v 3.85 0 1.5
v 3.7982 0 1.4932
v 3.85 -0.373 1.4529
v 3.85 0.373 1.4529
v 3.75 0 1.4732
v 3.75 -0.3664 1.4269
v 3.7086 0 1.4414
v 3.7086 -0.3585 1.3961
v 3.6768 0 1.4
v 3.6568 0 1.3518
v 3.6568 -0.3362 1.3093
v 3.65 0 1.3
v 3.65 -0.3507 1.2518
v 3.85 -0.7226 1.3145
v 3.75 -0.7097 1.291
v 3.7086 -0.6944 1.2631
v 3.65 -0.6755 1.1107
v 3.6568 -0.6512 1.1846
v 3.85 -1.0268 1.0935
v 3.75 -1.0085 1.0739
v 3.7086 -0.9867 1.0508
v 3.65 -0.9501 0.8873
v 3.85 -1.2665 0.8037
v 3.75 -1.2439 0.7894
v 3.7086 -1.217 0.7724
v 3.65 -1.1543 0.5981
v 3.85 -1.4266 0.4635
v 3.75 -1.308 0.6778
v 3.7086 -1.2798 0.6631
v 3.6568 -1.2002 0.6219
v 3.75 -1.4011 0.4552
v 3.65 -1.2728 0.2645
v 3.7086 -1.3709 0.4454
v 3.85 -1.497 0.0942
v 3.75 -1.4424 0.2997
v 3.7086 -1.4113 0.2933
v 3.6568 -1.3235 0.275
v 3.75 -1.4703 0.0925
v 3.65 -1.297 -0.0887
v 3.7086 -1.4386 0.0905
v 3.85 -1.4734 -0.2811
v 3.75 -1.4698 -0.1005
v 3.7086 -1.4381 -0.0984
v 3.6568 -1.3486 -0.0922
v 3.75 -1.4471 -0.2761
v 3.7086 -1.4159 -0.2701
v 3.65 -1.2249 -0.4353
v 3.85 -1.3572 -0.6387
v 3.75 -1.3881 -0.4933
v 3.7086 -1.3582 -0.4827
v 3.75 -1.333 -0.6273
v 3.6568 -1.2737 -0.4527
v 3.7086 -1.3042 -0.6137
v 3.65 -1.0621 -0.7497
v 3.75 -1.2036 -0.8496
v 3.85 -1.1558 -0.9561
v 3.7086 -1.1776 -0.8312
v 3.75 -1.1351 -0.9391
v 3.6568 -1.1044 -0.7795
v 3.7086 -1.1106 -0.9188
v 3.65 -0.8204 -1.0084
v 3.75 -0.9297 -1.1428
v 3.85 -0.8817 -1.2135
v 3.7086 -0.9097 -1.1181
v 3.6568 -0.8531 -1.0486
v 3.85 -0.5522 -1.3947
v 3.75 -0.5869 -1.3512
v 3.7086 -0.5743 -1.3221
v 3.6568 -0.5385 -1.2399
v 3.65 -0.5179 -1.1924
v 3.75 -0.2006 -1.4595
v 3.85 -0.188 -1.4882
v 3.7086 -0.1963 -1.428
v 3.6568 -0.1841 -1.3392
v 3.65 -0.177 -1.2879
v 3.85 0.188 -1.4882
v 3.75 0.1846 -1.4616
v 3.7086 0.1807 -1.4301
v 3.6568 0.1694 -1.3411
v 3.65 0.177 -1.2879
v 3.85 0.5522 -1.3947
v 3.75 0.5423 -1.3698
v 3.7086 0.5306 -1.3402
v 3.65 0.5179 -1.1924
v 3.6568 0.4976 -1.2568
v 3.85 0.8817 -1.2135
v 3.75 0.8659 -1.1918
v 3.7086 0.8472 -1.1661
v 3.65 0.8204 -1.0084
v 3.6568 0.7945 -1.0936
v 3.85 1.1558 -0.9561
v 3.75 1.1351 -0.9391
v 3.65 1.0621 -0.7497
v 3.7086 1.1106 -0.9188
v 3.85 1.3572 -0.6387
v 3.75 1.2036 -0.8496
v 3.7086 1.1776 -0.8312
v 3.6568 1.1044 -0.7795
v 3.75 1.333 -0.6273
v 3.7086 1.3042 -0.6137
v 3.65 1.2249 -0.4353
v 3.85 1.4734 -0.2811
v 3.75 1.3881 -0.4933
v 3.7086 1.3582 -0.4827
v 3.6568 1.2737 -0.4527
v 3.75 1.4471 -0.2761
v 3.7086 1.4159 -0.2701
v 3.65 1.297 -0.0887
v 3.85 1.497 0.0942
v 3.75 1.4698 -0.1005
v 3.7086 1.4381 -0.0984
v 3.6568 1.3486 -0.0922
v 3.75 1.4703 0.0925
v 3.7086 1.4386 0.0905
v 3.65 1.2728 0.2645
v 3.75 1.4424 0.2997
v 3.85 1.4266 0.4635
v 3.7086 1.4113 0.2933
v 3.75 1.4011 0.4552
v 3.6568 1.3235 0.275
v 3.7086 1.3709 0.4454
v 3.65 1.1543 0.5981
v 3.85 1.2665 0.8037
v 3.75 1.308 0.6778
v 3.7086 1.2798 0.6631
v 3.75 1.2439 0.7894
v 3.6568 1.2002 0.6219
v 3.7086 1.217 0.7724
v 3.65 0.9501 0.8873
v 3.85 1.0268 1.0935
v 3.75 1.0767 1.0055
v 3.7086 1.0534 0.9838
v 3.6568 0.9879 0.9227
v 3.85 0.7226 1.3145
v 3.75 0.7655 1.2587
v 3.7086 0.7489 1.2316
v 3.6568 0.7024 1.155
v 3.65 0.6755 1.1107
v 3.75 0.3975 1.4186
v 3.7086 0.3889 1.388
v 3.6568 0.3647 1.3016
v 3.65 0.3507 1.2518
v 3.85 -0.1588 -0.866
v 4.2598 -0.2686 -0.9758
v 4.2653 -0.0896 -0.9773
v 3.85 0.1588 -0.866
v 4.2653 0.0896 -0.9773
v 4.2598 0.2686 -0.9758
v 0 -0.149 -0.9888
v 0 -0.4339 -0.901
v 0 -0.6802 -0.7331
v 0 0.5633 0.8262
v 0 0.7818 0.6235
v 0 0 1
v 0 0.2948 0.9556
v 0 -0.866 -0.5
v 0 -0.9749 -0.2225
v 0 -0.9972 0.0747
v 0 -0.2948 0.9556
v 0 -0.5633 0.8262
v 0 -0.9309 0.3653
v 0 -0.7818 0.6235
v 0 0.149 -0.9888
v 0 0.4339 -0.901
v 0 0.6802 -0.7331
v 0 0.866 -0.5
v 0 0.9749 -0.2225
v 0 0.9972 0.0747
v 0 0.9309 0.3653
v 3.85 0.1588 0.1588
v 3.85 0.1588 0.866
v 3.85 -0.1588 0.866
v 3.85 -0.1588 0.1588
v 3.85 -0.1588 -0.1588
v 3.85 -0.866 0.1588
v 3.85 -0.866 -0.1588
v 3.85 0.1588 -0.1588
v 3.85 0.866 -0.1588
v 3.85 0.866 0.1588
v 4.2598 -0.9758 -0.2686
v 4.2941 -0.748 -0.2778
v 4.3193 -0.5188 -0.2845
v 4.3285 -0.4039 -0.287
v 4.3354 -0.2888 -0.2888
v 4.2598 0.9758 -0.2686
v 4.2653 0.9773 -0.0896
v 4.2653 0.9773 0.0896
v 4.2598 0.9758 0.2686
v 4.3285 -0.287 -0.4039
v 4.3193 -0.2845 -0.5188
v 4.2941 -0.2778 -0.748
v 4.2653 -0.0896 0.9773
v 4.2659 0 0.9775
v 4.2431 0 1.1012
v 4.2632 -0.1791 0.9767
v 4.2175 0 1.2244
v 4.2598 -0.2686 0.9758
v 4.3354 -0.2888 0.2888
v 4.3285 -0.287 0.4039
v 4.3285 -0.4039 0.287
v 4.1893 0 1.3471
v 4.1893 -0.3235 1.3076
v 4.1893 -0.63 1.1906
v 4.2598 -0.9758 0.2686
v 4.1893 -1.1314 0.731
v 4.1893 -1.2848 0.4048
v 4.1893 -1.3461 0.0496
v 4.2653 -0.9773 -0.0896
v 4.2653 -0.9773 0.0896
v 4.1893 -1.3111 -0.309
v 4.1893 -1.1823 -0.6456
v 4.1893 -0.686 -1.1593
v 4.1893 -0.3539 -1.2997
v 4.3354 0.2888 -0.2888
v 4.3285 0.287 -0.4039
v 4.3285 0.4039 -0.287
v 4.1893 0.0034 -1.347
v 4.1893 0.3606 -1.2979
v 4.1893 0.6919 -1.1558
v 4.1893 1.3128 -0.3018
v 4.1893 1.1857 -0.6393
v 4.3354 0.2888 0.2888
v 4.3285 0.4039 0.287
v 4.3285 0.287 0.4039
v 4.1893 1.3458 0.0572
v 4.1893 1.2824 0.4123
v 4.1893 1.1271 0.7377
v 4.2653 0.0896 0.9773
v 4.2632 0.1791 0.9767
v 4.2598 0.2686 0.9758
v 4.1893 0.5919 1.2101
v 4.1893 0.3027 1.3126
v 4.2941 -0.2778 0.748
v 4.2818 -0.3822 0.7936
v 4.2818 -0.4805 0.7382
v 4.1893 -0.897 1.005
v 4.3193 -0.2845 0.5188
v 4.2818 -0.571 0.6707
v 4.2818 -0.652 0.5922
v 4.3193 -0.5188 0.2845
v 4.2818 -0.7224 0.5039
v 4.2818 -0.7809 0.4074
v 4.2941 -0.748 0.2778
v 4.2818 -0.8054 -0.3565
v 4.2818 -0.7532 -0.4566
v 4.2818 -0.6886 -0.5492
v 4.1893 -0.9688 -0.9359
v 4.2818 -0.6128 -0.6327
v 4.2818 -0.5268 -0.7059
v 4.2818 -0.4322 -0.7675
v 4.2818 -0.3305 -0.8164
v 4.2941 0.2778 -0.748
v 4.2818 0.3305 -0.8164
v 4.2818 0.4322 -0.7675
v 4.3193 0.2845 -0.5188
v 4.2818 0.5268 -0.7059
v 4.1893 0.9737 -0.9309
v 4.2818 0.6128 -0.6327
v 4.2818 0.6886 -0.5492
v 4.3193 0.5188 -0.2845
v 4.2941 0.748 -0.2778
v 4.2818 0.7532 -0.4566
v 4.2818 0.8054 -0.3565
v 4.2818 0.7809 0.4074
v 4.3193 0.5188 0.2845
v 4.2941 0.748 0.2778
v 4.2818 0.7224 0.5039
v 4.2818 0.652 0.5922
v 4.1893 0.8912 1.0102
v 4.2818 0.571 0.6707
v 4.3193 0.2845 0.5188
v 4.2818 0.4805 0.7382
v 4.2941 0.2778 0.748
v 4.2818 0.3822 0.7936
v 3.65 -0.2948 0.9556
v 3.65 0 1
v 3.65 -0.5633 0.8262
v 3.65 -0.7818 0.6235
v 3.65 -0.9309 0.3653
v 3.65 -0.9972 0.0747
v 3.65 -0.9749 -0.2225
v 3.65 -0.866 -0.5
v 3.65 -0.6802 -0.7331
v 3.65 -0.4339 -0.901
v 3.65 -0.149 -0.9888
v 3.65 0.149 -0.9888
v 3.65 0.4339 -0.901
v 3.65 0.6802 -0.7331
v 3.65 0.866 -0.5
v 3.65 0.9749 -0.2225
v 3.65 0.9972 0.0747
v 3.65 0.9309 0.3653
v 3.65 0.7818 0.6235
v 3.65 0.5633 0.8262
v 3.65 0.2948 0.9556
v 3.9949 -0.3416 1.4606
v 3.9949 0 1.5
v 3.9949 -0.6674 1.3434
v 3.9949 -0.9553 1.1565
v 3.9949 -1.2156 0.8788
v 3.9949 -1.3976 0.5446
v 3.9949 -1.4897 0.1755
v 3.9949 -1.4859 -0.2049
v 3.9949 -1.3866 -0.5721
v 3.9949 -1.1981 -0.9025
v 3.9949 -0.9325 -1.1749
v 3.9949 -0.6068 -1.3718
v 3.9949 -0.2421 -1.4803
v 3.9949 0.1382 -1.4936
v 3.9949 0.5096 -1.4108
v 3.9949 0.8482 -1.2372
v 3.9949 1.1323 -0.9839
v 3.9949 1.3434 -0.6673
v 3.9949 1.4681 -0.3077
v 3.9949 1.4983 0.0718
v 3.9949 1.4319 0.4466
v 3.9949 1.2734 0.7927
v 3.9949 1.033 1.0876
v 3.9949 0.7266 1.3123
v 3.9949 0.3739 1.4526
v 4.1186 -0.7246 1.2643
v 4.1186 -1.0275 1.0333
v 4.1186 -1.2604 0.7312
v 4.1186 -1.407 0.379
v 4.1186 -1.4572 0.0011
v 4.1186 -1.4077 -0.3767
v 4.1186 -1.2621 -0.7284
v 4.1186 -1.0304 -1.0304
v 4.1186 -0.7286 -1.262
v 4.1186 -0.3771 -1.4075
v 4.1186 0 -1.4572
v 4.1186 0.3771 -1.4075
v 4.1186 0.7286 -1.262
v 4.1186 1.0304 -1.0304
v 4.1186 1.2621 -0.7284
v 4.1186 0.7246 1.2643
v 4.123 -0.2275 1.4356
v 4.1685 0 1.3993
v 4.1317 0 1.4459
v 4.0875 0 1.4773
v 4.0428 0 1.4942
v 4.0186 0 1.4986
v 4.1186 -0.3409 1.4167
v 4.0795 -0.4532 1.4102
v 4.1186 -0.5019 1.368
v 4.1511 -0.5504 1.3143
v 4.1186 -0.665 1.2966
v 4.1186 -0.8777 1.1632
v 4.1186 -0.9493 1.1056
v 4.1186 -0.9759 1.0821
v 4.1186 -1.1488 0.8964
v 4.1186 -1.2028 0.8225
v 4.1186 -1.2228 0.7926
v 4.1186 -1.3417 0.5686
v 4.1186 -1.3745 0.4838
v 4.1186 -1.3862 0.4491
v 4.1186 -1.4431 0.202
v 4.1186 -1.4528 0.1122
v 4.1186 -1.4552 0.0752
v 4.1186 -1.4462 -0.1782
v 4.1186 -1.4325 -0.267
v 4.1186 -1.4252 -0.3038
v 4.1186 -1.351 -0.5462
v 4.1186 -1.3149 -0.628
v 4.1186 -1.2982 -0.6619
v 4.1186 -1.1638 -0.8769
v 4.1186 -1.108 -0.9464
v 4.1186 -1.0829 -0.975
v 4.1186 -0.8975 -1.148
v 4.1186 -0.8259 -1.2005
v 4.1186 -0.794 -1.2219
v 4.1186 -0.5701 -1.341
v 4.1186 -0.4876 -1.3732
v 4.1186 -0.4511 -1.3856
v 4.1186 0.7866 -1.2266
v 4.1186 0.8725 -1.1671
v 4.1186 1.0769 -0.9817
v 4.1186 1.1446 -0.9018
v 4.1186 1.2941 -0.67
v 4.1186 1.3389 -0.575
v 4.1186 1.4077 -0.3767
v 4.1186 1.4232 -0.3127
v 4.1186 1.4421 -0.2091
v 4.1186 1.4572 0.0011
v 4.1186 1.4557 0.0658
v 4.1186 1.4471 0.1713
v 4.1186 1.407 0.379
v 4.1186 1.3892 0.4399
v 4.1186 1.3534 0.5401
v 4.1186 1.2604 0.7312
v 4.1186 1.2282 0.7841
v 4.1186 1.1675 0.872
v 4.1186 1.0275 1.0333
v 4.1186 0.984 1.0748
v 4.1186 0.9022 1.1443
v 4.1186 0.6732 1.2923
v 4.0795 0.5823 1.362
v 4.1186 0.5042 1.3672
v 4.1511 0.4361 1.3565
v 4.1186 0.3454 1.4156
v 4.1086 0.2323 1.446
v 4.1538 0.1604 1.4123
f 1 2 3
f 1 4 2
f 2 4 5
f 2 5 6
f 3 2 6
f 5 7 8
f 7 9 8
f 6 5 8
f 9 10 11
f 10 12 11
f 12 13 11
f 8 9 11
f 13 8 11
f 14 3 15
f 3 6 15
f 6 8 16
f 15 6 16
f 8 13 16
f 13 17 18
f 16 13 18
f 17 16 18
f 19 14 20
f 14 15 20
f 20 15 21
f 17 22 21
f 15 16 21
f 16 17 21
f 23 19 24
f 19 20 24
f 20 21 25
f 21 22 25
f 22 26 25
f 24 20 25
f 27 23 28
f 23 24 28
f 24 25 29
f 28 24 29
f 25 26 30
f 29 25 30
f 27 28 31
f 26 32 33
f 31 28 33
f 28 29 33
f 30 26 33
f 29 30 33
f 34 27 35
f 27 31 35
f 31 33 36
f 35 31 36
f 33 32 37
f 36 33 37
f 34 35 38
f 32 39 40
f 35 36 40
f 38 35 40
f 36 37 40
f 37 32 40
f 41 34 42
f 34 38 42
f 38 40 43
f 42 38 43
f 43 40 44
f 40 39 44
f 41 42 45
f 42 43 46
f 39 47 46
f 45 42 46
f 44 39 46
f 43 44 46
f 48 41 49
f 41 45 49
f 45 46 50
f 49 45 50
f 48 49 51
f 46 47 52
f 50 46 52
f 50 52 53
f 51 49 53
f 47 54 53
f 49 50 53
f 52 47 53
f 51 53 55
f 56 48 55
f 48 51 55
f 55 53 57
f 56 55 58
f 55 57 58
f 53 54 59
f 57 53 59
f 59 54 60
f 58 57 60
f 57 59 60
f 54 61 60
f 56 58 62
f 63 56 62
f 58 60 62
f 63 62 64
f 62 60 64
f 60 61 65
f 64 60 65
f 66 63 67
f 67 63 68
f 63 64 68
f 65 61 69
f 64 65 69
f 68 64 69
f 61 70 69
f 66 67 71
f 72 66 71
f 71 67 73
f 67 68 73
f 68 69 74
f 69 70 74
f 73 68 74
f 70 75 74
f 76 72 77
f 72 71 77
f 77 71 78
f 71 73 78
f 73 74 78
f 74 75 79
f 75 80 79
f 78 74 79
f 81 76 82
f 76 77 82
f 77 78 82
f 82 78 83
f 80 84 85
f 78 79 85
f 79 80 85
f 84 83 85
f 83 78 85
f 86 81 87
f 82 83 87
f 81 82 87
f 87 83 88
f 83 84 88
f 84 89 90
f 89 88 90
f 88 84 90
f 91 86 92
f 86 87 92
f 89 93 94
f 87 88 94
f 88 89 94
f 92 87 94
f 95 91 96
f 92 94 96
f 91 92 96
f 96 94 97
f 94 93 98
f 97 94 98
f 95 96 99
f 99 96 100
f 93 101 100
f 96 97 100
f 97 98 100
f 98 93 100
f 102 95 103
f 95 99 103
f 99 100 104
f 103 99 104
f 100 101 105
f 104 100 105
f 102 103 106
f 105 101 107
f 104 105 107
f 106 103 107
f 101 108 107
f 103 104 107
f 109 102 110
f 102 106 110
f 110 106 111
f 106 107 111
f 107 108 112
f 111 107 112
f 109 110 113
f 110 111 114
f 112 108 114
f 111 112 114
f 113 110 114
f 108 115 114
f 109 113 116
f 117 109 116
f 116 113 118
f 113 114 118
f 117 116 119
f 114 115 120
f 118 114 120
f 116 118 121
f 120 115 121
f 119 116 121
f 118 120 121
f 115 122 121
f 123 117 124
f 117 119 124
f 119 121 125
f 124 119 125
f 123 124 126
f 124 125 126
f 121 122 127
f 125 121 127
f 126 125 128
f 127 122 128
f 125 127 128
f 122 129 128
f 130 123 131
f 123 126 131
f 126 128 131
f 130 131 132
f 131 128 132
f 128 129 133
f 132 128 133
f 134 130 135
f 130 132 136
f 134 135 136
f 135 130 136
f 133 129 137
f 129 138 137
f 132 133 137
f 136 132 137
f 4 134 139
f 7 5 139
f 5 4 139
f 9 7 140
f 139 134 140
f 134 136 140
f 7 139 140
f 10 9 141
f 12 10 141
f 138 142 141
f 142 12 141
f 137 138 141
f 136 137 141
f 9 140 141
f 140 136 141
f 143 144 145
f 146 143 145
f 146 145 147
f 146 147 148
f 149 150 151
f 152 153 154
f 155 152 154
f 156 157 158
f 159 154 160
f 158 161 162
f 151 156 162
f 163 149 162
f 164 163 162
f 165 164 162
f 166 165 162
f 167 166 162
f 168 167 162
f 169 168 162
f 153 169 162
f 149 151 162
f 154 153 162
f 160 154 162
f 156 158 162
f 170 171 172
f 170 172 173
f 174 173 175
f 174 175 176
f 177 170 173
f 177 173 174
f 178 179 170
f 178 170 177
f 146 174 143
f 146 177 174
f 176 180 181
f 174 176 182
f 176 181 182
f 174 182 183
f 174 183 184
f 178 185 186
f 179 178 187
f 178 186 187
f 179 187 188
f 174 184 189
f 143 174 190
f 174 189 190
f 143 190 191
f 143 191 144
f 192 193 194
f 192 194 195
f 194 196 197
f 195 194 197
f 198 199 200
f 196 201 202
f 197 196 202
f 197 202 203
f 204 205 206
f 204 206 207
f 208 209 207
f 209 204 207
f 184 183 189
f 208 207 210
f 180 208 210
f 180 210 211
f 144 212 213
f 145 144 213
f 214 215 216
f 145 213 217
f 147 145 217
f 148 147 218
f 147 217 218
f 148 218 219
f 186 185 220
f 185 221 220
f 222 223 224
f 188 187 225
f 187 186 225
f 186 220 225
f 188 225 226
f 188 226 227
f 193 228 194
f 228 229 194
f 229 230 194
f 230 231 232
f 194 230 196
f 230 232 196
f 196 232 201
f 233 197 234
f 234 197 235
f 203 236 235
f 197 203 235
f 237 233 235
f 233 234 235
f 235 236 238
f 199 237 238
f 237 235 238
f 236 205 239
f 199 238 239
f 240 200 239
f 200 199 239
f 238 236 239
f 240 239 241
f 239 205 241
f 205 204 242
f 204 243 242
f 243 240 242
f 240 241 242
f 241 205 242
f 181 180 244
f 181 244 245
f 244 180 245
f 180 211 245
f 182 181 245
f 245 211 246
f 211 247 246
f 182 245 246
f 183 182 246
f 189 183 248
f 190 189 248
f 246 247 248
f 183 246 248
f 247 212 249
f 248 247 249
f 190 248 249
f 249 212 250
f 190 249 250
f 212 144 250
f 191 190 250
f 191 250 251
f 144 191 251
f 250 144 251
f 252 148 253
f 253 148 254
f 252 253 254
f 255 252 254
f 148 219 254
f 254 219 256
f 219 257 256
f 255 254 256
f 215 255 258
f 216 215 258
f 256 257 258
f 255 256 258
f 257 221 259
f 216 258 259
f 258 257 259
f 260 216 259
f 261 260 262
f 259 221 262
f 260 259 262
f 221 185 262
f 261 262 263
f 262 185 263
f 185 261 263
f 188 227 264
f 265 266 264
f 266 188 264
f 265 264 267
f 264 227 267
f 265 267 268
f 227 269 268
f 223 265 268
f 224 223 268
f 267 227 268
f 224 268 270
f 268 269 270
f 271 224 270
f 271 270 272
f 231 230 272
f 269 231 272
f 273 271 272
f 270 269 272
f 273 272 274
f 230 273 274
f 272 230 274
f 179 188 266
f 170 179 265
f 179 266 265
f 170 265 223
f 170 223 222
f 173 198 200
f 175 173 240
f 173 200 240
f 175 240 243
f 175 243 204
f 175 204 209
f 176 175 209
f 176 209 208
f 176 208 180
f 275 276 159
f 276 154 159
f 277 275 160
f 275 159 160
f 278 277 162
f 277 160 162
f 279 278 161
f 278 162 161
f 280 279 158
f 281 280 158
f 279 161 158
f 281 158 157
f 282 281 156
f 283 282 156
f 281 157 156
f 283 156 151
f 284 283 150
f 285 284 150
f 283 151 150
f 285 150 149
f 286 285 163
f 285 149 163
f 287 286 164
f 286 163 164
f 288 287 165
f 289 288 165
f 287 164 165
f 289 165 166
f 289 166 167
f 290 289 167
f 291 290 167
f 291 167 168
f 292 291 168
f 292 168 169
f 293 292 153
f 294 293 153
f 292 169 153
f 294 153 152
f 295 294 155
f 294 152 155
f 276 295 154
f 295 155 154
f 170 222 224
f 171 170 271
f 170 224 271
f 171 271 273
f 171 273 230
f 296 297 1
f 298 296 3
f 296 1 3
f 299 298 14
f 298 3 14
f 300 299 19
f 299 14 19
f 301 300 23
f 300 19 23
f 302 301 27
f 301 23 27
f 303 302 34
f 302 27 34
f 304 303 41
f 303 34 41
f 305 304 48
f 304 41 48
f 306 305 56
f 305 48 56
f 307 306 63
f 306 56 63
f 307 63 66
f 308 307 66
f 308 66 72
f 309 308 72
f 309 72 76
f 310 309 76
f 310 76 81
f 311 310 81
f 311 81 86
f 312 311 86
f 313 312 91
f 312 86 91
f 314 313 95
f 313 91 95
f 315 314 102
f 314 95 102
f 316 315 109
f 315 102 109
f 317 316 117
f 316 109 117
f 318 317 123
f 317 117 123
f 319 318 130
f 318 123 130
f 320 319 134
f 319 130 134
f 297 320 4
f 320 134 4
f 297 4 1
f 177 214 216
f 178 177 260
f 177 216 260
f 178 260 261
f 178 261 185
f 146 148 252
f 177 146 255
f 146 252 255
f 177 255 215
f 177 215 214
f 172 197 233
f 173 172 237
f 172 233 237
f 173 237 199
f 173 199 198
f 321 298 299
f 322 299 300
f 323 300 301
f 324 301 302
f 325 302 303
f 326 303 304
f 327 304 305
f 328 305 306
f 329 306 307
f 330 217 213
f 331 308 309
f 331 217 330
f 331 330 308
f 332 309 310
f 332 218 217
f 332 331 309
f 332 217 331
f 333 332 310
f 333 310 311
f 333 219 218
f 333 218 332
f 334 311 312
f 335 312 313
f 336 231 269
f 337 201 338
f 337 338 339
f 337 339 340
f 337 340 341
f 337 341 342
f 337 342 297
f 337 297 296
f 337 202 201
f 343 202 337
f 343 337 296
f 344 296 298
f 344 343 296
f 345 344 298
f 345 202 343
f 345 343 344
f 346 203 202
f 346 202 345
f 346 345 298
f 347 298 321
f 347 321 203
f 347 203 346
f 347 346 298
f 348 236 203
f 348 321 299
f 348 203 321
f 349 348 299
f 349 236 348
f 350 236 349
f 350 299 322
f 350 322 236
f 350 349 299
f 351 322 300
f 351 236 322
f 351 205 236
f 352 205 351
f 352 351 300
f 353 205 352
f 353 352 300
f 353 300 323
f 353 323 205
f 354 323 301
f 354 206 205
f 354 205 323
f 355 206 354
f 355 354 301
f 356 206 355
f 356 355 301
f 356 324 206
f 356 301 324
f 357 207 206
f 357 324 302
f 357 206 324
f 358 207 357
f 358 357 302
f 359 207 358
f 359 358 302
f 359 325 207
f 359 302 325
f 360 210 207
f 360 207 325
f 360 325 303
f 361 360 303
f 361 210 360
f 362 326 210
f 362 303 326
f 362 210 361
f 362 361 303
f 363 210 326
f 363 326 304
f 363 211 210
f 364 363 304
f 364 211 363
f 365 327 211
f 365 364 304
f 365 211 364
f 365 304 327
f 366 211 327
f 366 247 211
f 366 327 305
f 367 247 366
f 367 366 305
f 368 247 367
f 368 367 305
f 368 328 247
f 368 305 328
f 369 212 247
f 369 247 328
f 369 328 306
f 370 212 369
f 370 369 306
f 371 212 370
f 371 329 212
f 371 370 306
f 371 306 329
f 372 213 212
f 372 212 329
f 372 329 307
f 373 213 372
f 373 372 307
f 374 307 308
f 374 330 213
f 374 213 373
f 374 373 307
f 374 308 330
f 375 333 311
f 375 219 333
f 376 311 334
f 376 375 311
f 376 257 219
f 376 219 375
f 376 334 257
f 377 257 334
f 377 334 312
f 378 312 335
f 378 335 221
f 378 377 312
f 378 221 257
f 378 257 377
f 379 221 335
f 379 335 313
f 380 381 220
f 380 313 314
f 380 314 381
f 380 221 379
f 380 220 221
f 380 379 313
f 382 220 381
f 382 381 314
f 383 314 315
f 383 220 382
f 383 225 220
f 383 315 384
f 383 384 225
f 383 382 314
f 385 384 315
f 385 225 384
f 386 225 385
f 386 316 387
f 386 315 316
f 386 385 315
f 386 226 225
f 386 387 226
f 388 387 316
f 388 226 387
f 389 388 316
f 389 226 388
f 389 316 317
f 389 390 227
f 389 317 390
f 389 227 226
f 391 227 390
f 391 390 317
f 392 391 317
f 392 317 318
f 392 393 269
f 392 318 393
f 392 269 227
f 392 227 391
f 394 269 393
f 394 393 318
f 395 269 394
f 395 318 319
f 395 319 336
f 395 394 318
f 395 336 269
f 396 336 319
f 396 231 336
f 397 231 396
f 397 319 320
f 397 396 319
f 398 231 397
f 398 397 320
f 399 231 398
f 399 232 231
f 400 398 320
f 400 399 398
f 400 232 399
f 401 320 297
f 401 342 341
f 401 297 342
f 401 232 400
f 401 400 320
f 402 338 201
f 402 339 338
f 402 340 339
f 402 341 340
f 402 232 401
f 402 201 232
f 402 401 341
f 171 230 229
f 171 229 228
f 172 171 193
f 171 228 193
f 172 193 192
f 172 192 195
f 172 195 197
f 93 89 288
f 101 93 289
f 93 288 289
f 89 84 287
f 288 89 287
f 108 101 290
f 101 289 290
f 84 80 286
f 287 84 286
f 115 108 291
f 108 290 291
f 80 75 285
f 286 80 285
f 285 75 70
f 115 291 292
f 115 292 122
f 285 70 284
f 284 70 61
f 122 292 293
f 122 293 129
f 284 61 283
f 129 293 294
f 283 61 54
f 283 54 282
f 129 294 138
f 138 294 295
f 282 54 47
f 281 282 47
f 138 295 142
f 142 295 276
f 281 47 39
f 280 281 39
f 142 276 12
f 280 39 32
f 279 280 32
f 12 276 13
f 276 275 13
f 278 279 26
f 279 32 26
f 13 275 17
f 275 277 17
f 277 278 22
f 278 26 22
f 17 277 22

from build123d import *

# Parameters (mm, degrees)
FILLET1_R          = 0.2
CUT_EXTRUDE1_DEPTH = 0.5
CUT_EXTRUDE1_DRAFT = -15


with BuildPart() as part:
    # Sketch1 → Revolve1 (revolve)
    with BuildSketch(Plane.XY, mode=Mode.PRIVATE) as revolve1_sk:
        with BuildLine():
            Line((0, 0), (4.35, 0))
            ThreePointArc((4.35, 0), (4.299779731, 0.756637298), (4.15, 1.5))
            Line((4.15, 1.5), (3.65, 1.5))
            Line((3.65, 1.5), (3.65, 1))
            Line((3.65, 1), (0, 1))
            Line((0, 1), (0, 0))
        make_face()
    revolve(revolve1_sk.sketch.rotate(Axis((-102.03816923, 0, 0), (1, 0, 0)), 90), axis=Axis((-102.03816923, 0, 0), (1, 0, 0)))

    # Fillet1
    fillet1_edges = [part.edges().sort_by_distance(p)[0] for p in [
        (3.65, 0, -1.5),
        (4.15, 0, -1.5),
    ]]
    fillet(fillet1_edges, radius=FILLET1_R)


with BuildPart() as cut_extrude1_tool:
    # Sketch2 → Cut-Extrude1 (with draft: the straight prism first)
    with BuildSketch(Plane(origin=(4.35, 0, 0), x_dir=(0, 0, -1), z_dir=(1, 0, 0))):
        Polygon((0.29273093, 1), (-0.29273093, 1), (-0.29273093, 0.29273093), (-1, 0.29273093), (-1, -0.29273093), (-0.29273093, -0.29273093), (-0.29273093, -1), (0.29273093, -1), (0.29273093, -0.29273093), (1, -0.29273093), (1, 0.29273093), (0.29273093, 0.29273093), align=None)
    extrude(amount=-CUT_EXTRUDE1_DEPTH)
    # Cut-Extrude1: the draft: its side faces are tilted about the plane it starts from
    cut_extrude1_sides = [cut_extrude1_tool.faces().sort_by_distance(p)[0] for p in [
        (4.1, 1, 0),
        (4.1, 0.646365465, 0.29273093),
        (4.1, 0.29273093, 0.646365465),
        (4.1, 0, 1),
        (4.1, -0.29273093, 0.646365465),
        (4.1, -0.646365465, 0.29273093),
        (4.1, -1, 0),
        (4.1, -0.646365465, -0.29273093),
        (4.1, -0.29273093, -0.646365465),
        (4.1, 0, -1),
        (4.1, 0.29273093, -0.646365465),
        (4.1, 0.646365465, -0.29273093),
    ]]
    draft(cut_extrude1_sides, Plane(origin=(4.35, 0, 0), x_dir=(0, 0, -1), z_dir=(1, 0, 0)), CUT_EXTRUDE1_DRAFT)


with BuildPart() as part_1:
    add(part.part)

    # Cut-Extrude1: cut by cut_extrude1_tool
    add(cut_extrude1_tool.part, mode=Mode.SUBTRACT)


solid = part_1.part
